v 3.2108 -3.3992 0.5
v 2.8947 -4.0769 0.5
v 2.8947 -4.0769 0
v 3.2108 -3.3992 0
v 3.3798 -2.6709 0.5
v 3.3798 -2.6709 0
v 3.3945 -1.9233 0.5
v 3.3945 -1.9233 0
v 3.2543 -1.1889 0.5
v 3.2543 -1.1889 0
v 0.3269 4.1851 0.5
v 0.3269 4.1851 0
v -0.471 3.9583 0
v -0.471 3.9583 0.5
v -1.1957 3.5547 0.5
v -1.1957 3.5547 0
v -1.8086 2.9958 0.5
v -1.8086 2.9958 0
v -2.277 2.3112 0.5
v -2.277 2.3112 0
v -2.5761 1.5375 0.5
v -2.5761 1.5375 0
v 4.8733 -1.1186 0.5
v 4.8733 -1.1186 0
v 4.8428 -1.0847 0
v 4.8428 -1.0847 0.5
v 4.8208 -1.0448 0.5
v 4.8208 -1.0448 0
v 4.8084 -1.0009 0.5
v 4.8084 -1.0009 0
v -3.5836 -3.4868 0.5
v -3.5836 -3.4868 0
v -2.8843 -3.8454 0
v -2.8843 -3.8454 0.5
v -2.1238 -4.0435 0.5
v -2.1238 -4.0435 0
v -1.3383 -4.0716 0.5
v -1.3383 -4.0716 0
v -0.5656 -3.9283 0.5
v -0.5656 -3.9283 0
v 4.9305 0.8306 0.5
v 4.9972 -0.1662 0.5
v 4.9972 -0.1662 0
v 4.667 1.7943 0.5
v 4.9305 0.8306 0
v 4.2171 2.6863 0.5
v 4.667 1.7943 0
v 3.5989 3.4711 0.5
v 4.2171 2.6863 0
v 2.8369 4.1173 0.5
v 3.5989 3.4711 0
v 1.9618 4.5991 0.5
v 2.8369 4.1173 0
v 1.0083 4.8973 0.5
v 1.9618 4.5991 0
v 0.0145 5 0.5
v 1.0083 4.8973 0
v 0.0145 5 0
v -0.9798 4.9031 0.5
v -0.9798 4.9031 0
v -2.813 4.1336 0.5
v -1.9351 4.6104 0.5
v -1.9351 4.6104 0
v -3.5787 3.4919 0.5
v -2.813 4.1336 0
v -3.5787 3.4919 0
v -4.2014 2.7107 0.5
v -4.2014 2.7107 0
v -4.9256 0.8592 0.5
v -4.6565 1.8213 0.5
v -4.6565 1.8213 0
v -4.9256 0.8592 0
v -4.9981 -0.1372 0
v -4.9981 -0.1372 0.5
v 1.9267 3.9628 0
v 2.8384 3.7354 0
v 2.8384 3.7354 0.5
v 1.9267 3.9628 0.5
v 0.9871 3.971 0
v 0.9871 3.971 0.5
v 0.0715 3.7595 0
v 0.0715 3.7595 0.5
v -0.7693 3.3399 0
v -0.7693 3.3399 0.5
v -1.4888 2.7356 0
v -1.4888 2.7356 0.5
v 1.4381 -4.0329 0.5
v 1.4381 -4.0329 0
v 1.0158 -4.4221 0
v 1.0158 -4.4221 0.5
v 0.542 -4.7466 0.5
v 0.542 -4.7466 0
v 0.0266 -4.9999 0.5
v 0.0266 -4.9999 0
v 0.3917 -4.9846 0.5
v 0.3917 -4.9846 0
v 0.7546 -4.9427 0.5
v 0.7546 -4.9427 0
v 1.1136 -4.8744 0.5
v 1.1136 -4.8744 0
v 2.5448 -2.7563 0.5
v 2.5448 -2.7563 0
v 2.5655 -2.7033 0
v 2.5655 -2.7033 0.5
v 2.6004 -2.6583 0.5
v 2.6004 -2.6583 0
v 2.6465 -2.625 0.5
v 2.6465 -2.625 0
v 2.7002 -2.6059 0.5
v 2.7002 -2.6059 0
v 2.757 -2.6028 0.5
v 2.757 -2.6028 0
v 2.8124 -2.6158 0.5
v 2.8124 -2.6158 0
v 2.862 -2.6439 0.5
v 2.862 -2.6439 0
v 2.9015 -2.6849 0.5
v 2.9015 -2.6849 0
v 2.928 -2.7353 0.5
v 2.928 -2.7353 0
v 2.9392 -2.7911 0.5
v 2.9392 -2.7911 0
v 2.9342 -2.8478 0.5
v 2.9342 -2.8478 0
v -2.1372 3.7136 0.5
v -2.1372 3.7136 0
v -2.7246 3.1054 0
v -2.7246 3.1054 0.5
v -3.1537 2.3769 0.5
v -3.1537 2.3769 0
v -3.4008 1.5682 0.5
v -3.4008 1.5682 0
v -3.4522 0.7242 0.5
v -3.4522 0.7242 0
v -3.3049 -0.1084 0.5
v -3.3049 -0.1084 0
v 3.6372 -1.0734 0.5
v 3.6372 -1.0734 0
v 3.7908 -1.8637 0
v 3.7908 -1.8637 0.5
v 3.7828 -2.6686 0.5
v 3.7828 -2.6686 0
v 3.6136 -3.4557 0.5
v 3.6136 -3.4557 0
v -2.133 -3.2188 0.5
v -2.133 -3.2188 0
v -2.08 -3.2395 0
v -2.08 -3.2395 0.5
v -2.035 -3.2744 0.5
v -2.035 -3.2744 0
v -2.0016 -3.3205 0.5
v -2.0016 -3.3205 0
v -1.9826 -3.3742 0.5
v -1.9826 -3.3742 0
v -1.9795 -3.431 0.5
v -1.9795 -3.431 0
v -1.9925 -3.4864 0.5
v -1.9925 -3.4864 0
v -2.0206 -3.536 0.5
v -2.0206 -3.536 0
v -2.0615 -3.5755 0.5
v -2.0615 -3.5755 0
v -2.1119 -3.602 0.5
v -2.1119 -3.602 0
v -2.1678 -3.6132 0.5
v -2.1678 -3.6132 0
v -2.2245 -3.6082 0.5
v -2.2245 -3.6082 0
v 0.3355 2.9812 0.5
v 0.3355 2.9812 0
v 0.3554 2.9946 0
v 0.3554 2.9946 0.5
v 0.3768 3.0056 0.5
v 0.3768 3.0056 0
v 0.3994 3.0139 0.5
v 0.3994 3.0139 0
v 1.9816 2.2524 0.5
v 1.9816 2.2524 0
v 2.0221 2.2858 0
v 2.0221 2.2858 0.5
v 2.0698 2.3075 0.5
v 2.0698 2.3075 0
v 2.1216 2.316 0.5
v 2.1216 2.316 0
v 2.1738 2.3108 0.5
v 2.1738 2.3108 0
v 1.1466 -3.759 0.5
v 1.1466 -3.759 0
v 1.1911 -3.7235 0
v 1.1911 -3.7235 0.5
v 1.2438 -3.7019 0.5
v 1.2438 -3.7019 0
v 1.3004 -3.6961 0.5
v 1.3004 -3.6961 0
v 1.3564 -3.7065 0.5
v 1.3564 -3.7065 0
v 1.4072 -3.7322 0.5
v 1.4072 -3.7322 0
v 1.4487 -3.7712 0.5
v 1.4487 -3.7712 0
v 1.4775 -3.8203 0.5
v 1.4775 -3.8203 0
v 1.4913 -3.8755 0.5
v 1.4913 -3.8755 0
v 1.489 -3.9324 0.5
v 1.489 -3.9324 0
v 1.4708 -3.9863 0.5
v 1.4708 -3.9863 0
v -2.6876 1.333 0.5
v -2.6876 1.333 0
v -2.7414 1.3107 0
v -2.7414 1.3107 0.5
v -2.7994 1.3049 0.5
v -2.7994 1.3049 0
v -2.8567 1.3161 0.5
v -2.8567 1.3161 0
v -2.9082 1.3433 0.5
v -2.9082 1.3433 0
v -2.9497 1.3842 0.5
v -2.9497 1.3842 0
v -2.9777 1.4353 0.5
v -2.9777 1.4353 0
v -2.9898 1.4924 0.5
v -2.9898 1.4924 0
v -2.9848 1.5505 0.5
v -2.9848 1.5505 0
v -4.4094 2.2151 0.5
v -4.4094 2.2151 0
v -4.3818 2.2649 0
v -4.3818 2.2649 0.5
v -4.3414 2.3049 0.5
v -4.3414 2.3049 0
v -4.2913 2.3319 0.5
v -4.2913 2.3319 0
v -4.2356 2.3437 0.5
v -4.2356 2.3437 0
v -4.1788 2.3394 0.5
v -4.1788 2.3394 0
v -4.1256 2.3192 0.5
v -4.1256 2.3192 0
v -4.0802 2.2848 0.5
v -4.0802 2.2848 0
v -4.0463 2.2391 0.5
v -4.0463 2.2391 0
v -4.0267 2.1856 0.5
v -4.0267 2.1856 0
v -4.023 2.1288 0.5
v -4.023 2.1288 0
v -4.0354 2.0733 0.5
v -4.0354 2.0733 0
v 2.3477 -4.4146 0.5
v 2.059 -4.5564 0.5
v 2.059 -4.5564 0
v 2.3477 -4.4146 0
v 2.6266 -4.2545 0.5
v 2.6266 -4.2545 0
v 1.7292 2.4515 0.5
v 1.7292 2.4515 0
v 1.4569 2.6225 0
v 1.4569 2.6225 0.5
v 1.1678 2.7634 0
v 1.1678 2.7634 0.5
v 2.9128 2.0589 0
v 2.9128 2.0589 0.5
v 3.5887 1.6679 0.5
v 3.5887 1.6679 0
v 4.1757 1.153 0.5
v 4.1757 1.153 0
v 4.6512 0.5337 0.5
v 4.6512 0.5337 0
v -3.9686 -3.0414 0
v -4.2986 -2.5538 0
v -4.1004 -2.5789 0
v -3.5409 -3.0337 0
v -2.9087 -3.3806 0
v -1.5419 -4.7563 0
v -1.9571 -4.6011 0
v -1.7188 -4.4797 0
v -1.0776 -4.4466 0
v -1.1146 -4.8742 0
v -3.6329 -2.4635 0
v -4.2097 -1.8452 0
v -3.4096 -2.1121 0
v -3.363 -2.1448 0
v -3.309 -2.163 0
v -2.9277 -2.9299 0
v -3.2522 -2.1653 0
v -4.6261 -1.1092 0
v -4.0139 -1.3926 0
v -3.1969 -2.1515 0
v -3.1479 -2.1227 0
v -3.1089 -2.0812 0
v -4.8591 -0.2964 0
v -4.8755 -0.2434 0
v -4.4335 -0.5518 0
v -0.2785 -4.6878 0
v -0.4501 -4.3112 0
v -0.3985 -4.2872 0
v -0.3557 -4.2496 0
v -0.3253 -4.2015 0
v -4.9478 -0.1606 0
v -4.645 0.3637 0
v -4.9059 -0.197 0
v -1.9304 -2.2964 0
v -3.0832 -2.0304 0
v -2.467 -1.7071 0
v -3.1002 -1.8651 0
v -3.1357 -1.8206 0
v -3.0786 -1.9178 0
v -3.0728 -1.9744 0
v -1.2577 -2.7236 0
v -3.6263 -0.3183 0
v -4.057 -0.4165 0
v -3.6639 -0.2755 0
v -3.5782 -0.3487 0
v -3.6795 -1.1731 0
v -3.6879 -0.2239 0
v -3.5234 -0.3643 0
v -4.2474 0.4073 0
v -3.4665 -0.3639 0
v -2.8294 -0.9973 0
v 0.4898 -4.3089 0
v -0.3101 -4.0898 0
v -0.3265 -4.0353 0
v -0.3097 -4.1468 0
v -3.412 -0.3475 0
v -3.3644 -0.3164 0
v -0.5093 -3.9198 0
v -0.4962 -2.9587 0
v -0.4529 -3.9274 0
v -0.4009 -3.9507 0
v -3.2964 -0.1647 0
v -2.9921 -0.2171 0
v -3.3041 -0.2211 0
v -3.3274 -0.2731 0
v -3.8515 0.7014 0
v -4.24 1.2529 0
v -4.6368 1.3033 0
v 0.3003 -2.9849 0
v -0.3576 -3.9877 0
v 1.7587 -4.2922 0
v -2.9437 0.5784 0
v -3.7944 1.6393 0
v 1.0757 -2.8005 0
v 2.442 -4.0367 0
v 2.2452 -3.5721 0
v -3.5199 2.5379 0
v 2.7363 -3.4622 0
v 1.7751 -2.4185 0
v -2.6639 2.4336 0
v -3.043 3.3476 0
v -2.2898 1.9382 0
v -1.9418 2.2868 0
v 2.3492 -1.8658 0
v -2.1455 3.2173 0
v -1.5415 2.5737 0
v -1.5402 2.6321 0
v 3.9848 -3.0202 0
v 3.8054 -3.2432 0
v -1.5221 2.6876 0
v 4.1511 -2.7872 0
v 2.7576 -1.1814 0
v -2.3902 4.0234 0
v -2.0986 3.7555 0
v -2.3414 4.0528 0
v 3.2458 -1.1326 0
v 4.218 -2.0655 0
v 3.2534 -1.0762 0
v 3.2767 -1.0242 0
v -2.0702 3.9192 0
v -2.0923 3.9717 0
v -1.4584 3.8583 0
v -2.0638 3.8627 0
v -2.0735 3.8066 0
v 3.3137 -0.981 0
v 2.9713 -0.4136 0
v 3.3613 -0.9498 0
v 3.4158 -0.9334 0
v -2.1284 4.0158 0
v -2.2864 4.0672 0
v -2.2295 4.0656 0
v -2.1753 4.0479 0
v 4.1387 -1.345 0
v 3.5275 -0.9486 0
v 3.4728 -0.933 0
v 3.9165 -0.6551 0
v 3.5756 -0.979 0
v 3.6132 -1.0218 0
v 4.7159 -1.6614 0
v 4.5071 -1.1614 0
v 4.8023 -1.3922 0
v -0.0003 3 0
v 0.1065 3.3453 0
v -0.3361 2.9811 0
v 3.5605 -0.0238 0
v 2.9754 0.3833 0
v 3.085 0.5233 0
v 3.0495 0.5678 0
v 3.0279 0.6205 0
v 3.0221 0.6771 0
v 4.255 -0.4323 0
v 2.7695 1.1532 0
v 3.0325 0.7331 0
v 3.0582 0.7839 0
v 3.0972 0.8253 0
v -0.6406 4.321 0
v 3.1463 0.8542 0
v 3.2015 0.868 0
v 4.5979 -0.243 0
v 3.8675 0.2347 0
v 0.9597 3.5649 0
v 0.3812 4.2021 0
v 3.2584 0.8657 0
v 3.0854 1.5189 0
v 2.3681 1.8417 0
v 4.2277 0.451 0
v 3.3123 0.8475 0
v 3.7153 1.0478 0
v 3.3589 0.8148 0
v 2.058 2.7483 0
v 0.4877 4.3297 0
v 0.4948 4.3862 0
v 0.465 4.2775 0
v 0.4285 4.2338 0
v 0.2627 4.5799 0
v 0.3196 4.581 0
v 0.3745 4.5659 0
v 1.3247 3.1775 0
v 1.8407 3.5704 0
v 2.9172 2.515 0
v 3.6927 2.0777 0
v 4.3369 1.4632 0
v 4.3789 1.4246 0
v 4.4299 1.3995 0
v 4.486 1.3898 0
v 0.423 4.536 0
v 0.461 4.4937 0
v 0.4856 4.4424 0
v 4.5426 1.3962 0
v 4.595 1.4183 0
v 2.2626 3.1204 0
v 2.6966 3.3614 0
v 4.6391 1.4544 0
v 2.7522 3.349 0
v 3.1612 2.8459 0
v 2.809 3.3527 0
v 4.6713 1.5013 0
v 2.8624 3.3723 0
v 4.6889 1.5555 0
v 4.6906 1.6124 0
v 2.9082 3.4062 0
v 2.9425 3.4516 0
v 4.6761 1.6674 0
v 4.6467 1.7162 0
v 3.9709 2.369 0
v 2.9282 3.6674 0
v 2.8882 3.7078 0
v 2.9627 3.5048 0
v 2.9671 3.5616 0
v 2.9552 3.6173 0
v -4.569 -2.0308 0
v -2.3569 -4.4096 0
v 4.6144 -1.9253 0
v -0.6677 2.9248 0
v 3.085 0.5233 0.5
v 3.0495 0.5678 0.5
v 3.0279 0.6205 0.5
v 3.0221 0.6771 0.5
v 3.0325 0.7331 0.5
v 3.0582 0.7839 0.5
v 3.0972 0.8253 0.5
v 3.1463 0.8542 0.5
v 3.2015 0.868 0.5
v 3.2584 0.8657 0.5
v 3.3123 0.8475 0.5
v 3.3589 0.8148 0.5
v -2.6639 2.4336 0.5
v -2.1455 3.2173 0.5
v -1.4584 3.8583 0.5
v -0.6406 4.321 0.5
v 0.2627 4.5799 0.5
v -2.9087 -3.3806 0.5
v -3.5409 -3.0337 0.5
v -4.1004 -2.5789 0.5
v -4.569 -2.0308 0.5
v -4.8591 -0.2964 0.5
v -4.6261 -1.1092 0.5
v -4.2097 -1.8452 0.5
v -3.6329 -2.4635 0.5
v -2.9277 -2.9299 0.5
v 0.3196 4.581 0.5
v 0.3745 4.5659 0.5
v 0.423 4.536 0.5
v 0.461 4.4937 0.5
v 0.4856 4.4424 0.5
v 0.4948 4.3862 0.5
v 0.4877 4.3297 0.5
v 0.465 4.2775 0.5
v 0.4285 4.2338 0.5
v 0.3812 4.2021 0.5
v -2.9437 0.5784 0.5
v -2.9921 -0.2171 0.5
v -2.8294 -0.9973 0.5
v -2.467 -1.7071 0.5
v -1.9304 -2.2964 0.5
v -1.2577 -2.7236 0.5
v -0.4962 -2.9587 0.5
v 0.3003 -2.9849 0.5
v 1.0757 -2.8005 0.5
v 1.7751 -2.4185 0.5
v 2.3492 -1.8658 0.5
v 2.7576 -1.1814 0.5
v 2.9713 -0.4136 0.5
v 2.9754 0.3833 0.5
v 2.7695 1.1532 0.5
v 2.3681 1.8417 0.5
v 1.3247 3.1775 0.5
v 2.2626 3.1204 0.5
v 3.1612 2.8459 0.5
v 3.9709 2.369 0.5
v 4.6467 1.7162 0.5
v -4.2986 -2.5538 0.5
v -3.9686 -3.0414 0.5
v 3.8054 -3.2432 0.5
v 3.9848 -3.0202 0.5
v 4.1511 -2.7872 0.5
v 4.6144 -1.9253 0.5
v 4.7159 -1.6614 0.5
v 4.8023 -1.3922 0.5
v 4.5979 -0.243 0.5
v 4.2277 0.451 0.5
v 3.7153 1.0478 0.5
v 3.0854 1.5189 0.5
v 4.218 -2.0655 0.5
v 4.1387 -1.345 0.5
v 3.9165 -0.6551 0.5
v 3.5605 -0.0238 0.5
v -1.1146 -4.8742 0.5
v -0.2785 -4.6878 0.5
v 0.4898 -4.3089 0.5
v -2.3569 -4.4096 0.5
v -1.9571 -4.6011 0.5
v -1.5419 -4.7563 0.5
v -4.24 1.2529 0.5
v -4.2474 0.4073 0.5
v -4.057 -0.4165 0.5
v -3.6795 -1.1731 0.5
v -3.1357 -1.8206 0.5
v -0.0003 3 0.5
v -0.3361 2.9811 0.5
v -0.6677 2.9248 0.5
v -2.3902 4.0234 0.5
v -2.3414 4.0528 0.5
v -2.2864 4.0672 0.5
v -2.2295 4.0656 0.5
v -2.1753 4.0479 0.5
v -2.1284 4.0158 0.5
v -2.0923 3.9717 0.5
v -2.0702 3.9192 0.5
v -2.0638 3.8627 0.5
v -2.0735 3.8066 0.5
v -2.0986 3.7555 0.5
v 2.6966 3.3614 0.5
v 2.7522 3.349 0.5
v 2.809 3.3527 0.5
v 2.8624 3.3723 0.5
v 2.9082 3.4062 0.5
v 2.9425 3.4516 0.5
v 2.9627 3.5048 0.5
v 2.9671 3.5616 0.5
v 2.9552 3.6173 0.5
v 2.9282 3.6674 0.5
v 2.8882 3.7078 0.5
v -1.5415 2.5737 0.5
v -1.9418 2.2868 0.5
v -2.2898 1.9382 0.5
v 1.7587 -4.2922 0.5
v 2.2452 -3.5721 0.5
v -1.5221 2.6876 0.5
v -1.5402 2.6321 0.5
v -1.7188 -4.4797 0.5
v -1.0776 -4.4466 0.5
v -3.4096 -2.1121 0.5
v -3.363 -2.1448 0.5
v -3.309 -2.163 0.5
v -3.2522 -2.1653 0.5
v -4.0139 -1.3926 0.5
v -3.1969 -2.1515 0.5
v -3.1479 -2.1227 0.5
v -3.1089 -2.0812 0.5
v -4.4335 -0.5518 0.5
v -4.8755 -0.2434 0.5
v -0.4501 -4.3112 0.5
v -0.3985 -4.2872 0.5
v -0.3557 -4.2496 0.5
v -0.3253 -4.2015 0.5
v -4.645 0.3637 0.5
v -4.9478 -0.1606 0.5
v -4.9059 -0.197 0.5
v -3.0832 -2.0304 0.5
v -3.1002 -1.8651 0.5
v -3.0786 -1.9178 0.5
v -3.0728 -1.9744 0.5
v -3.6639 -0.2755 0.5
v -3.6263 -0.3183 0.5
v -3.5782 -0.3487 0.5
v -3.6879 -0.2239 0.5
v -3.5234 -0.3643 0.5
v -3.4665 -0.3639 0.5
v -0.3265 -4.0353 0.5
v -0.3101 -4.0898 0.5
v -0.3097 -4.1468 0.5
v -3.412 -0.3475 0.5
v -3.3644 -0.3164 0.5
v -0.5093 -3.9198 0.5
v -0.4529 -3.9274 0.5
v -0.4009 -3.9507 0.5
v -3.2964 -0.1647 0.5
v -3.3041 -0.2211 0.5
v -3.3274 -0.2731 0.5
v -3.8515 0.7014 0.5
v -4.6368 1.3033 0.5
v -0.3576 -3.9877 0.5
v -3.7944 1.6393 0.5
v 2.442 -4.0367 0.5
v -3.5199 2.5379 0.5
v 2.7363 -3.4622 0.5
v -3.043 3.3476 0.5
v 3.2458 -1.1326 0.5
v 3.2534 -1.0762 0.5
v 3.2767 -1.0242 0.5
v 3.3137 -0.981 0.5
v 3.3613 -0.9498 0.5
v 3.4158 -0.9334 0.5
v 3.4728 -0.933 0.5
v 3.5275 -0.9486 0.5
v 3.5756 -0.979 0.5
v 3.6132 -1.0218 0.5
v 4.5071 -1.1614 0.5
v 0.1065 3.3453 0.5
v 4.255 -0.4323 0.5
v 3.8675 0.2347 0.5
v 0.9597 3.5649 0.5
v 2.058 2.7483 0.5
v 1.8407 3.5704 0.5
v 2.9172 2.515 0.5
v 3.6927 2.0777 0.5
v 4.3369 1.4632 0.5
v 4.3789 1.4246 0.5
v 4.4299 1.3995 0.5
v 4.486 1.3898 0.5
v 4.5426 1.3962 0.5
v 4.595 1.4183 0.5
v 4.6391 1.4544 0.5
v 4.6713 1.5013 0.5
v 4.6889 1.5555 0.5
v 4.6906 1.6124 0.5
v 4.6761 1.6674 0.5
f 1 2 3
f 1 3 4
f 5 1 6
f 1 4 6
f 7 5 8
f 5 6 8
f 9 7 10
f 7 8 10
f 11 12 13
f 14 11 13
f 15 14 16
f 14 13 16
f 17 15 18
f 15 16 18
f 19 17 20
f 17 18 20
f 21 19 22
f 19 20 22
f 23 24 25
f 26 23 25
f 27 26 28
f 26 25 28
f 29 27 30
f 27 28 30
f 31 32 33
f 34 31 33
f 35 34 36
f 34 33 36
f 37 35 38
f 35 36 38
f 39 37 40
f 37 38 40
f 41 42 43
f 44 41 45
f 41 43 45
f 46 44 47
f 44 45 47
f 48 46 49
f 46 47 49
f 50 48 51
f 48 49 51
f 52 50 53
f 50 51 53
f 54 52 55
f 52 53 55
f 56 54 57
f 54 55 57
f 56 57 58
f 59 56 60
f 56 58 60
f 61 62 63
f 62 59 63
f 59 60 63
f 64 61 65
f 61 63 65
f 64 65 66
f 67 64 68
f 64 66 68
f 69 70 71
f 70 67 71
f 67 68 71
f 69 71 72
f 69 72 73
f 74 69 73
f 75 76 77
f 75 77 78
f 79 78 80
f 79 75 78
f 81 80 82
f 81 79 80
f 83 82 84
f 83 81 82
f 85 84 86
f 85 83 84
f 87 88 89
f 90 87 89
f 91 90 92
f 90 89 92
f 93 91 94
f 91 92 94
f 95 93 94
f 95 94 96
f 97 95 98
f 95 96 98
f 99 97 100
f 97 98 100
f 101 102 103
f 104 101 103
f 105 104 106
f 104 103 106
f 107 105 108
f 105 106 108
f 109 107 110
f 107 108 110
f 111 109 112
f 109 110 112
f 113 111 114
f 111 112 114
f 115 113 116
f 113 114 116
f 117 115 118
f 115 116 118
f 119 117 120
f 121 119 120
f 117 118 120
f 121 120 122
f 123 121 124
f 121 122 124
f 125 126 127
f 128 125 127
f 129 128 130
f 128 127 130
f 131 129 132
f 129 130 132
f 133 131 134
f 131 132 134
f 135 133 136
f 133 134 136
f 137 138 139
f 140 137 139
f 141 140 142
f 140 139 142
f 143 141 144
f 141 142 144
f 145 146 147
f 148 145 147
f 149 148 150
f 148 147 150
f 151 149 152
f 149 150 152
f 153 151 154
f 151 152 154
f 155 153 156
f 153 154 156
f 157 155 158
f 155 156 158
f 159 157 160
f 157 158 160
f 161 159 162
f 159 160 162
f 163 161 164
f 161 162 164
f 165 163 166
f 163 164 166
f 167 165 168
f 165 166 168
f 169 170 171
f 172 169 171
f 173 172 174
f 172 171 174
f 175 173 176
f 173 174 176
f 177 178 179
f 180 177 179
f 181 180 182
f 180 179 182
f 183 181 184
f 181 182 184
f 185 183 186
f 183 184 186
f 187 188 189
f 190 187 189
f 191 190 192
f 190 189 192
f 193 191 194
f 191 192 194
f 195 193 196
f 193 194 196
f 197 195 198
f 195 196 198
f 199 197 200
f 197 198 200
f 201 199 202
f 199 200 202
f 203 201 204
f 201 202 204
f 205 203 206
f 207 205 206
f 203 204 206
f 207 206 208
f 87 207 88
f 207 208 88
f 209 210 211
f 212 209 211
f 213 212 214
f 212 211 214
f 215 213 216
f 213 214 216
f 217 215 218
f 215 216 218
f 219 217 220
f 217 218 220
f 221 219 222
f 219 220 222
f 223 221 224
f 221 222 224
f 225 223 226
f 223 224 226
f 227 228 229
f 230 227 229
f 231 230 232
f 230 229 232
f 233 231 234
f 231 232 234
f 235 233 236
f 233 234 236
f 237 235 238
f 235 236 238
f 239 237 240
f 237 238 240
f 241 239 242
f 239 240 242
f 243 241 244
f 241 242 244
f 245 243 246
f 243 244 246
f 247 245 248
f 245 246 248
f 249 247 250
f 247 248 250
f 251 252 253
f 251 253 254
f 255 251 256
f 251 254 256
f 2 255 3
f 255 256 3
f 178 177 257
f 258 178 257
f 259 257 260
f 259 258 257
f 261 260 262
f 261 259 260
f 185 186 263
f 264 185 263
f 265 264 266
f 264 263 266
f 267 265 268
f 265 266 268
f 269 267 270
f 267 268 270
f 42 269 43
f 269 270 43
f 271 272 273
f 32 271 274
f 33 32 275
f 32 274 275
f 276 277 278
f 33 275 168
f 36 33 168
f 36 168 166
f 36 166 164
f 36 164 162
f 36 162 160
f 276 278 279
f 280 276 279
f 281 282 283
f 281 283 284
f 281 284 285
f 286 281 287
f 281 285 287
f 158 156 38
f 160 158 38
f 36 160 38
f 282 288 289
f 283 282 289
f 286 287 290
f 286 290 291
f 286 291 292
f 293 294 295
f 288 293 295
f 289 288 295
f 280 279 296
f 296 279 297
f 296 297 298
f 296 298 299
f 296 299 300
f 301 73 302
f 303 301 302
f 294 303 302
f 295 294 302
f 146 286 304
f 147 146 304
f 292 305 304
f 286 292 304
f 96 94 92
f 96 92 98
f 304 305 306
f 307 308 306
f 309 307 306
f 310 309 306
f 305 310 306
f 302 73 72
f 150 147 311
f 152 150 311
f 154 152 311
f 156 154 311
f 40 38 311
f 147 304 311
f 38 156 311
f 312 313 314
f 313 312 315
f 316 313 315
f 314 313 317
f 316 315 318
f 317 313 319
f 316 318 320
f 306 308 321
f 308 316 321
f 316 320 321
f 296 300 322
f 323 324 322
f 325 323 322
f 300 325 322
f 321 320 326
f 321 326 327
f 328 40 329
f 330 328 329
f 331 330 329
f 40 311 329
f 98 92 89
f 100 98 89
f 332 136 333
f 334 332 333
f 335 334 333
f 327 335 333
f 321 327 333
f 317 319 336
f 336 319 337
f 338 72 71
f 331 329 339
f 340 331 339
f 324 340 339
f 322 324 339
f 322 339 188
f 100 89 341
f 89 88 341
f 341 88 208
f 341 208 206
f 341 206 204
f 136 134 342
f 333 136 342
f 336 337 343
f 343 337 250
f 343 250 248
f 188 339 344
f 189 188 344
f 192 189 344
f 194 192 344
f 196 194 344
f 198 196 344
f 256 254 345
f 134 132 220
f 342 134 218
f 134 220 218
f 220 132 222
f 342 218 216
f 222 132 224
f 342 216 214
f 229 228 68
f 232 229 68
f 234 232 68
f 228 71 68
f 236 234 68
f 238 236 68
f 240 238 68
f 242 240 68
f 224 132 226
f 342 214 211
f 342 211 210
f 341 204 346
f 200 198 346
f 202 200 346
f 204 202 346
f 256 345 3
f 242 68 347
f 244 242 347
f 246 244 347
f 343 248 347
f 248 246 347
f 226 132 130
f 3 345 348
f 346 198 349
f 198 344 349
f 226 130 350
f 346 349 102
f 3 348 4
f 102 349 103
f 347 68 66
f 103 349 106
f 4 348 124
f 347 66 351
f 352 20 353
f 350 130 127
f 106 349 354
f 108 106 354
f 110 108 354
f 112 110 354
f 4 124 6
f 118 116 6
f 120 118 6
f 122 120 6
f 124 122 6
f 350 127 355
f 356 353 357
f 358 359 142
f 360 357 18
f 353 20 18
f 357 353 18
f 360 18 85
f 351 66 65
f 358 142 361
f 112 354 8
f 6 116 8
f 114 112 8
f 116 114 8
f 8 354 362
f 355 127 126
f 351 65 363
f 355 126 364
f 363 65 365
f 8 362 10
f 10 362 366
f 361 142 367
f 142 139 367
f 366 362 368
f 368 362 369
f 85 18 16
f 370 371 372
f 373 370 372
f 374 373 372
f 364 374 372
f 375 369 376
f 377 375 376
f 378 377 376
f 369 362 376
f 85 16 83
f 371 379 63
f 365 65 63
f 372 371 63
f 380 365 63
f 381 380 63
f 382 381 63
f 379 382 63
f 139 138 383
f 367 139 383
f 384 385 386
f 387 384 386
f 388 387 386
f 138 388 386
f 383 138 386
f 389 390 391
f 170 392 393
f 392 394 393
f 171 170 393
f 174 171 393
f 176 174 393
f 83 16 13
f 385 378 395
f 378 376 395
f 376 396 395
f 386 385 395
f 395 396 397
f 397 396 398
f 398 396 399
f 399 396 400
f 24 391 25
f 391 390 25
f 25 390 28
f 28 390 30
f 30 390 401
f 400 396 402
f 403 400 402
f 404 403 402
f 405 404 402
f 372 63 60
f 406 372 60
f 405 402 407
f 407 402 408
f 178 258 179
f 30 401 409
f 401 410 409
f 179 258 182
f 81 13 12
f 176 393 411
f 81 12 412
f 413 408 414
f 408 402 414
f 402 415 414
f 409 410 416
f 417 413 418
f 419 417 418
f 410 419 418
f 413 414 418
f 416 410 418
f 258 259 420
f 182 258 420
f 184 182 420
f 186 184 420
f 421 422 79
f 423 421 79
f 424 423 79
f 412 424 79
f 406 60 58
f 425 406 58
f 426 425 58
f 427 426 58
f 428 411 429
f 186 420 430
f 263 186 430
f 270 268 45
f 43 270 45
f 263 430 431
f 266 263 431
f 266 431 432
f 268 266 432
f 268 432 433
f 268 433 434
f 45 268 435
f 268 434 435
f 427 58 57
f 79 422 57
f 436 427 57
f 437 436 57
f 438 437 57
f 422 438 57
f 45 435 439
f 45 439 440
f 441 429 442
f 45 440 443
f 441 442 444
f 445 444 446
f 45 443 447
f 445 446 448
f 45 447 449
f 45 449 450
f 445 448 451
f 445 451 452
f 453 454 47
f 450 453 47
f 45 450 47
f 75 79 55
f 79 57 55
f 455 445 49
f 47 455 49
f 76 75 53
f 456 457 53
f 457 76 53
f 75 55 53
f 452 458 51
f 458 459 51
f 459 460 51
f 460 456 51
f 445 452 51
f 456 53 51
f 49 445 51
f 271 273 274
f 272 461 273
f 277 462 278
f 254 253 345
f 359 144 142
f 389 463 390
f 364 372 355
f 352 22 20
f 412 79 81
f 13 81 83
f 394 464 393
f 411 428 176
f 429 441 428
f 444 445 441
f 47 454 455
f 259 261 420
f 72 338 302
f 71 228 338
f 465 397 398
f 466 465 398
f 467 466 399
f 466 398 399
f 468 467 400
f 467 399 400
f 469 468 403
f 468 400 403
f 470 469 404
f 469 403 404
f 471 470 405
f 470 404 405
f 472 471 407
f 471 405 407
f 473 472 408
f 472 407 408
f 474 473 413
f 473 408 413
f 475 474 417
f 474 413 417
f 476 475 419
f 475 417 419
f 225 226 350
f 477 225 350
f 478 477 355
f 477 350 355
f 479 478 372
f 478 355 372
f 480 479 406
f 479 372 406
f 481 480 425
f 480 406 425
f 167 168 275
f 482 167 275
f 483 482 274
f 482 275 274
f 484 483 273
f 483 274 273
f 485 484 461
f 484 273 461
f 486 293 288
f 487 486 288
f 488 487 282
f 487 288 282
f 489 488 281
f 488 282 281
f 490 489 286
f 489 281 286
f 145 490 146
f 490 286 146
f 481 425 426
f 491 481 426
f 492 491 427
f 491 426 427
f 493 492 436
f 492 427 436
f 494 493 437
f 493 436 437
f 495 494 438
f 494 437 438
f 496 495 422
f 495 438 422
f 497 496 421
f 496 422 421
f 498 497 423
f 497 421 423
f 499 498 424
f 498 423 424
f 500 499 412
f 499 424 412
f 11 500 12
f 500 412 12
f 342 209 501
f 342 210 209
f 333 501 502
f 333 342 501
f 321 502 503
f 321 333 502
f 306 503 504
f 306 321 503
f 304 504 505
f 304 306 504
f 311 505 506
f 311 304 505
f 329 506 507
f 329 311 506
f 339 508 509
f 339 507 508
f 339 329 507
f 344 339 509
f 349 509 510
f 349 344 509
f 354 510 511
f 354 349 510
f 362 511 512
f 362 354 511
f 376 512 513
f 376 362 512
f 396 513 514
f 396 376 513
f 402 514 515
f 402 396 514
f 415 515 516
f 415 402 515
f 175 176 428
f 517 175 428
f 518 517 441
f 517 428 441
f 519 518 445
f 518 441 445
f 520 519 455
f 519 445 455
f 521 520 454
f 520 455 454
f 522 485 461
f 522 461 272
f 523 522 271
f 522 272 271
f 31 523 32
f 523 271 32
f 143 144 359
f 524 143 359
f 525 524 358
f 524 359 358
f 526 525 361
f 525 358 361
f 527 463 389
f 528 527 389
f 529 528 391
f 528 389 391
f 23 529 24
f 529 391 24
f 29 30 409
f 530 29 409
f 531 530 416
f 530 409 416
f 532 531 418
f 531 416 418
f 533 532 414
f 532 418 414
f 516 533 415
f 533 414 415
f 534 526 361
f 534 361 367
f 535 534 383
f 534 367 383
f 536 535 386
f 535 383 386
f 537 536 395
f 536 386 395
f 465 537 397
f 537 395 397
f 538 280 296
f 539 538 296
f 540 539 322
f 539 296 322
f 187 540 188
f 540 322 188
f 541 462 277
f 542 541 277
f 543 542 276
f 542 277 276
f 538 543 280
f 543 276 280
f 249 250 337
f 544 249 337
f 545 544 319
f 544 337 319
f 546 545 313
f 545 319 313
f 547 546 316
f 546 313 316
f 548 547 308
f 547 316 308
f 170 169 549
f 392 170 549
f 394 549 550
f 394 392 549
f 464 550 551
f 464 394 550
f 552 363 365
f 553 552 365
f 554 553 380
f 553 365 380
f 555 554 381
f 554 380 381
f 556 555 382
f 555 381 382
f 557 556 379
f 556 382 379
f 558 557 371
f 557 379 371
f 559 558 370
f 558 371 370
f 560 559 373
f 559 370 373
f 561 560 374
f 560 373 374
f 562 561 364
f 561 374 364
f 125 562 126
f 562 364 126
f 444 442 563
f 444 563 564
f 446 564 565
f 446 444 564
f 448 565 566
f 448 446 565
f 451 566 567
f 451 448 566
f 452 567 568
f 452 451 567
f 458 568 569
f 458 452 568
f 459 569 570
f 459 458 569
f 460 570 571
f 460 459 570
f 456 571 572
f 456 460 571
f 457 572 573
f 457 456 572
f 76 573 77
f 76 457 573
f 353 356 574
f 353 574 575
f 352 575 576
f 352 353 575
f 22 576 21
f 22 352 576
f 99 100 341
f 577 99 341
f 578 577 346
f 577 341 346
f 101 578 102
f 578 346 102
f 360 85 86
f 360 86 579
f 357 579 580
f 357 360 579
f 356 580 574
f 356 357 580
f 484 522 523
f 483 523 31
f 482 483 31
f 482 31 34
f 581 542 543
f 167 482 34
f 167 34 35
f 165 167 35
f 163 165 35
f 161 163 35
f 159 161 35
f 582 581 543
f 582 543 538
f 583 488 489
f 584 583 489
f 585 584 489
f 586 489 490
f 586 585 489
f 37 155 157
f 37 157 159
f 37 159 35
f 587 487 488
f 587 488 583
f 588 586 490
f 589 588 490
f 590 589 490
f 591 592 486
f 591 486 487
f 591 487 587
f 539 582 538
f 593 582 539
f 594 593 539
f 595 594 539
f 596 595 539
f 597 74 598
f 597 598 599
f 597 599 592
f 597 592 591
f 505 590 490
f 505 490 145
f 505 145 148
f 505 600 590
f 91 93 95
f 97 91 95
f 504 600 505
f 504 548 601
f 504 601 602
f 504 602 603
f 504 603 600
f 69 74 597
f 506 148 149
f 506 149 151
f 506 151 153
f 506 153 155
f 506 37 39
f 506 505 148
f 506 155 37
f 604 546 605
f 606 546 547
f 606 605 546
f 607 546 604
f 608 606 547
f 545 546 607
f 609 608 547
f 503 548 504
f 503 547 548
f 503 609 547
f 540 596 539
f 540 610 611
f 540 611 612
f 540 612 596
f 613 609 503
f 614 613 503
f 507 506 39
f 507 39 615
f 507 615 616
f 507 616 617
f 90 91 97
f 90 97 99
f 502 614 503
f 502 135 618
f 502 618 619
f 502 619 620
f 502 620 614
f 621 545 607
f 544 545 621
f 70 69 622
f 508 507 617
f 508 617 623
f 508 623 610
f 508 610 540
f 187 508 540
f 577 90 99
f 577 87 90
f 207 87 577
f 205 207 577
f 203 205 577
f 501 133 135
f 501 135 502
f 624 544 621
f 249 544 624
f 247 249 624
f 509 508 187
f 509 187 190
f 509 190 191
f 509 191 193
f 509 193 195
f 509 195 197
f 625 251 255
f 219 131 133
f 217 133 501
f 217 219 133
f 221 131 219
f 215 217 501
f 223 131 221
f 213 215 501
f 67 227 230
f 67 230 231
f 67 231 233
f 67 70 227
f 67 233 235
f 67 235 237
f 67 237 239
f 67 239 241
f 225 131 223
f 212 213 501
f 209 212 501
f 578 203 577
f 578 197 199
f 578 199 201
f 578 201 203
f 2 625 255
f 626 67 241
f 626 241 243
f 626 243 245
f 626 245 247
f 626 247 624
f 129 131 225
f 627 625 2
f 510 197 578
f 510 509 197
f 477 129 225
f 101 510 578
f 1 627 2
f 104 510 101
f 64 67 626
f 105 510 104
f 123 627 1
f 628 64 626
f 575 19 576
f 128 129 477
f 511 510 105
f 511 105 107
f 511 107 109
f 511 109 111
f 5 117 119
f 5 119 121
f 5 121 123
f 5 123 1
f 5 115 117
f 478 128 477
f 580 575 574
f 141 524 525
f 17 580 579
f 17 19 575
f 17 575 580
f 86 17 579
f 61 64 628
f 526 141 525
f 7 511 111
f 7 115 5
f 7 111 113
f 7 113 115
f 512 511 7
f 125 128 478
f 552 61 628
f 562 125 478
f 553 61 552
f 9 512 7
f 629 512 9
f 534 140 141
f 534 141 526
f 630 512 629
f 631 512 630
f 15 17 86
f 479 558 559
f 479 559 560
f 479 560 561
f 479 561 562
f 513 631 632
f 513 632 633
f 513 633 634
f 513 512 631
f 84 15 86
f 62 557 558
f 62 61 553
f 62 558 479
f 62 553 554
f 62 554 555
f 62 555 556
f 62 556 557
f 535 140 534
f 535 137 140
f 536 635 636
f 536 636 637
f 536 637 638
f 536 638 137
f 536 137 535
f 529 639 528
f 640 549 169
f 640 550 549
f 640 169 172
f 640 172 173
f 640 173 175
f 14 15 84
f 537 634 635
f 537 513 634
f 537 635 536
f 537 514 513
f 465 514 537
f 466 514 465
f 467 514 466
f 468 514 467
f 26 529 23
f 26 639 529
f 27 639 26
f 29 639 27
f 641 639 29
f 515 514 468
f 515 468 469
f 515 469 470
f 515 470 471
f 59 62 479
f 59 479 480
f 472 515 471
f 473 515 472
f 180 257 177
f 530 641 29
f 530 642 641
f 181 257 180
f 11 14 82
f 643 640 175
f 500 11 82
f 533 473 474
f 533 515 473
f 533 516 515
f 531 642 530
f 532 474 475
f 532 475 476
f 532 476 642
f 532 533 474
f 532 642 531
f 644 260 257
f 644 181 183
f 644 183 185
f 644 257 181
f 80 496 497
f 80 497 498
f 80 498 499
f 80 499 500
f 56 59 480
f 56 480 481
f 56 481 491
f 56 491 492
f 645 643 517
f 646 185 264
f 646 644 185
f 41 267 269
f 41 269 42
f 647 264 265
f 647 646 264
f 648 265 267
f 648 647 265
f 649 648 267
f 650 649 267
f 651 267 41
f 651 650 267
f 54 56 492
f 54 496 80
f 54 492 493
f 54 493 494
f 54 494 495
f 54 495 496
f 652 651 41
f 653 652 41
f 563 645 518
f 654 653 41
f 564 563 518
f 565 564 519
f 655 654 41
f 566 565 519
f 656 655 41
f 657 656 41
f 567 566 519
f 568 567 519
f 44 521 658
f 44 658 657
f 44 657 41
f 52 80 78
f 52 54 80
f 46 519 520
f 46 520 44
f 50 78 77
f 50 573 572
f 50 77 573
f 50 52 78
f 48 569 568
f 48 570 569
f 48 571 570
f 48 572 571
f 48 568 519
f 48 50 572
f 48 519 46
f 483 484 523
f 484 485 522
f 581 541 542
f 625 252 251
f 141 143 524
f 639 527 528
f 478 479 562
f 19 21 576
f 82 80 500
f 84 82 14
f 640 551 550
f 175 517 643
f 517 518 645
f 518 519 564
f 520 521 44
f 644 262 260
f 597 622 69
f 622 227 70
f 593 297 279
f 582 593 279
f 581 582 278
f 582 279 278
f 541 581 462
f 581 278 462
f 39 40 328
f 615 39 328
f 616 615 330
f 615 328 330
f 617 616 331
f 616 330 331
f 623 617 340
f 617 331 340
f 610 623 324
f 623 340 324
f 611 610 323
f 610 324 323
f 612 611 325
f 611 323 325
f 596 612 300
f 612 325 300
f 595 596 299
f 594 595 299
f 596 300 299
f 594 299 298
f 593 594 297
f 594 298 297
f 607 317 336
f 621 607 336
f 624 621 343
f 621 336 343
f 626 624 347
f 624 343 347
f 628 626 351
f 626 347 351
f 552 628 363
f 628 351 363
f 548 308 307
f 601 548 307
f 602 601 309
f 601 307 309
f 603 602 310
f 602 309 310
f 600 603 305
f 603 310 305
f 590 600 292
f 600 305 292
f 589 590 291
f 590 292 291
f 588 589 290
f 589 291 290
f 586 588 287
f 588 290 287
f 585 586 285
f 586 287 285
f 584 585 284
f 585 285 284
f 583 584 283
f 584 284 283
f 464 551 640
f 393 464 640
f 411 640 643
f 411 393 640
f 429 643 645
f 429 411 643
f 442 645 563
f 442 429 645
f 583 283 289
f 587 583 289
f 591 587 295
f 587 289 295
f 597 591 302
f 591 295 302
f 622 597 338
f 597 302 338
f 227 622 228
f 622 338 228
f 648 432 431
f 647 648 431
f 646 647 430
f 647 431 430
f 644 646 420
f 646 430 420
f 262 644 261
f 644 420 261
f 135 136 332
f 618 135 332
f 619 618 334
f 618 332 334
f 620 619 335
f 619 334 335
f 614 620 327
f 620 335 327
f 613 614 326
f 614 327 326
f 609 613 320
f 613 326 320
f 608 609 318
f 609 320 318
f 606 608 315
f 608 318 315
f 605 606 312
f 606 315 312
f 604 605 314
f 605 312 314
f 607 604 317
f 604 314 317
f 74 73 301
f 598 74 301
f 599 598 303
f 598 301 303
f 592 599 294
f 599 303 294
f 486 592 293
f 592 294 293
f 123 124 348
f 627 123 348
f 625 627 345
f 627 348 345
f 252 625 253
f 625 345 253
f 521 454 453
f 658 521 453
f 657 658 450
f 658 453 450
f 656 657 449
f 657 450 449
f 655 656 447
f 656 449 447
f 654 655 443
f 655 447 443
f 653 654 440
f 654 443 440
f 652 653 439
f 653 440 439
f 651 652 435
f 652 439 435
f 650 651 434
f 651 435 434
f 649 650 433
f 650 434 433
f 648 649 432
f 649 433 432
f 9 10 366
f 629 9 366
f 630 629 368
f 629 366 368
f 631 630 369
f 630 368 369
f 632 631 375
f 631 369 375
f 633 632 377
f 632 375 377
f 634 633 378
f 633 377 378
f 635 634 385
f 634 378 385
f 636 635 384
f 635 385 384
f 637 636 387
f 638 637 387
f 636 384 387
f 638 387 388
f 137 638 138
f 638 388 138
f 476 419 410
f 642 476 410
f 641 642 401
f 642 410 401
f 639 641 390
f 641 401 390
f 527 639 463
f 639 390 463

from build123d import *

# Parameters (mm, degrees)
SKETCH4_R           = 5
SKETCH4_R_2         = 3
BOSS_EXTRUDE2_DEPTH = 0.5
CUT_EXTRUDE1_DEPTH  = 0.5


with BuildPart() as part:
    # Sketch4 → Boss-Extrude2 (new body)
    with BuildSketch(Plane.XY):
        Circle(SKETCH4_R)
        Circle(SKETCH4_R_2, mode=Mode.SUBTRACT)
    extrude(amount=BOSS_EXTRUDE2_DEPTH)

    # Sketch5 → Cut-Extrude1 (cut)
    with BuildSketch(Plane.XY):
        with BuildLine():
            ThreePointArc((2.838380277, 3.735395811), (0.523052201, 3.89223631), (-1.488789119, 2.735587034))
            ThreePointArc((-1.488789119, 2.735587034), (-1.479999142, 2.452880939), (-1.197293047, 2.461670915))
            ThreePointArc((-1.197293047, 2.461670915), (0.613101285, 3.502504142), (2.696594047, 3.361368186))
            ThreePointArc((2.696594047, 3.361368186), (2.954500975, 3.477488883), (2.838380277, 3.735395811))
        make_face()
        with BuildLine():
            ThreePointArc((4.336939093, 1.463159243), (2.603149411, 2.627132948), (0.514885315, 2.630942098))
            ThreePointArc((0.514885315, 2.630942098), (0.265659666, 2.764682803), (0.399400371, 3.013908452))
            ThreePointArc((0.399400371, 3.013908452), (2.7200307, 3.009675448), (4.646743383, 1.716183554))
            ThreePointArc((4.646743383, 1.716183554), (4.618353394, 1.434769253), (4.336939093, 1.463159243))
        make_face()
        with BuildLine():
            ThreePointArc((4.808415103, -1.000910445), (3.888896046, 0.874015193), (2.082310864, 1.921446063))
            ThreePointArc((2.082310864, 1.921446063), (1.933345473, 2.161881735), (2.173781146, 2.310847125))
            ThreePointArc((2.173781146, 2.310847125), (4.181389462, 1.146866072), (5.203225644, -0.93668711))
            ThreePointArc((5.203225644, -0.93668711), (5.037932041, -1.166204048), (4.808415103, -1.000910445))
        make_face()
        with BuildLine():
            ThreePointArc((3.98469046, -3.370595397), (4.125826417, -1.287102636), (3.08499319, 0.523291697))
            ThreePointArc((3.08499319, 0.523291697), (3.076203214, 0.805997792), (3.358909309, 0.814787769))
            ThreePointArc((3.358909309, 0.814787769), (4.515558585, -1.197053551), (4.358718086, -3.512381628))
            ThreePointArc((4.358718086, -3.512381628), (4.100811158, -3.628502325), (3.98469046, -3.370595397))
        make_face()
        with BuildLine():
            ThreePointArc((2.086481518, -5.010940443), (3.250455223, -3.277150761), (3.254264373, -1.188886665))
            ThreePointArc((3.254264373, -1.188886665), (3.388005078, -0.939661016), (3.637230727, -1.073401721))
            ThreePointArc((3.637230727, -1.073401721), (3.632997723, -3.394032051), (2.339505829, -5.320744734))
            ThreePointArc((2.339505829, -5.320744734), (2.058091528, -5.292354744), (2.086481518, -5.010940443))
        make_face()
        with BuildLine():
            ThreePointArc((-0.37758817, -5.482416453), (1.497337468, -4.562897396), (2.544768337, -2.756312214))
            ThreePointArc((2.544768337, -2.756312214), (2.78520401, -2.607346824), (2.9341694, -2.847782496))
            ThreePointArc((2.9341694, -2.847782496), (1.770188347, -4.855390812), (-0.313364835, -5.877226994))
            ThreePointArc((-0.313364835, -5.877226994), (-0.542881773, -5.711933391), (-0.37758817, -5.482416453))
        make_face()
        with BuildLine():
            ThreePointArc((-2.747273122, -4.658691811), (-0.663780361, -4.799827767), (1.146613972, -3.75899454))
            ThreePointArc((1.146613972, -3.75899454), (1.429320067, -3.750204564), (1.438110043, -4.032910659))
            ThreePointArc((1.438110043, -4.032910659), (-0.573731276, -5.189559935), (-2.889059353, -5.032719436))
            ThreePointArc((-2.889059353, -5.032719436), (-3.00518005, -4.774812508), (-2.747273122, -4.658691811))
        make_face()
        with BuildLine():
            ThreePointArc((-4.387618168, -2.760482868), (-2.653828487, -3.924456573), (-0.56556439, -3.928265723))
            ThreePointArc((-0.56556439, -3.928265723), (-0.316338742, -4.062006428), (-0.450079446, -4.311232077))
            ThreePointArc((-0.450079446, -4.311232077), (-2.770709776, -4.306999073), (-4.697422459, -3.013507179))
            ThreePointArc((-4.697422459, -3.013507179), (-4.669032469, -2.732092879), (-4.387618168, -2.760482868))
        make_face()
        with BuildLine():
            ThreePointArc((-4.859094178, -0.29641318), (-3.939575121, -2.171338818), (-2.132989939, -3.218769688))
            ThreePointArc((-2.132989939, -3.218769688), (-1.984024549, -3.45920536), (-2.224460221, -3.60817075))
            ThreePointArc((-2.224460221, -3.60817075), (-4.232068537, -2.444189697), (-5.253904719, -0.360636515))
            ThreePointArc((-5.253904719, -0.360636515), (-5.088611116, -0.131119577), (-4.859094178, -0.29641318))
        make_face()
        with BuildLine():
            ThreePointArc((-4.035369536, 2.073271772), (-4.176505492, -0.01022099), (-3.135672265, -1.820615322))
            ThreePointArc((-3.135672265, -1.820615322), (-3.126882289, -2.103321417), (-3.409588384, -2.112111394))
            ThreePointArc((-3.409588384, -2.112111394), (-4.56623766, -0.100270074), (-4.409397161, 2.215058003))
            ThreePointArc((-4.409397161, 2.215058003), (-4.151490233, 2.3311787), (-4.035369536, 2.073271772))
        make_face()
        with BuildLine():
            ThreePointArc((-2.137160594, 3.713616818), (-3.301134298, 1.979827136), (-3.304943449, -0.10843696))
            ThreePointArc((-3.304943449, -0.10843696), (-3.438684153, -0.357662609), (-3.687909802, -0.223921904))
            ThreePointArc((-3.687909802, -0.223921904), (-3.683676798, 2.096708426), (-2.390184904, 4.023421109))
            ThreePointArc((-2.390184904, 4.023421109), (-2.108770604, 3.995031119), (-2.137160594, 3.713616818))
        make_face()
        with BuildLine():
            ThreePointArc((0.326909095, 4.185092828), (-1.548016544, 3.265573771), (-2.595447413, 1.458988589))
            ThreePointArc((-2.595447413, 1.458988589), (-2.835883085, 1.310023199), (-2.984848475, 1.550458871))
            ThreePointArc((-2.984848475, 1.550458871), (-1.820867422, 3.558067187), (0.26268576, 4.579903369))
            ThreePointArc((0.26268576, 4.579903369), (0.492202698, 4.414609766), (0.326909095, 4.185092828))
        make_face()
    extrude(amount=CUT_EXTRUDE1_DEPTH, mode=Mode.SUBTRACT)


solid = part.part
